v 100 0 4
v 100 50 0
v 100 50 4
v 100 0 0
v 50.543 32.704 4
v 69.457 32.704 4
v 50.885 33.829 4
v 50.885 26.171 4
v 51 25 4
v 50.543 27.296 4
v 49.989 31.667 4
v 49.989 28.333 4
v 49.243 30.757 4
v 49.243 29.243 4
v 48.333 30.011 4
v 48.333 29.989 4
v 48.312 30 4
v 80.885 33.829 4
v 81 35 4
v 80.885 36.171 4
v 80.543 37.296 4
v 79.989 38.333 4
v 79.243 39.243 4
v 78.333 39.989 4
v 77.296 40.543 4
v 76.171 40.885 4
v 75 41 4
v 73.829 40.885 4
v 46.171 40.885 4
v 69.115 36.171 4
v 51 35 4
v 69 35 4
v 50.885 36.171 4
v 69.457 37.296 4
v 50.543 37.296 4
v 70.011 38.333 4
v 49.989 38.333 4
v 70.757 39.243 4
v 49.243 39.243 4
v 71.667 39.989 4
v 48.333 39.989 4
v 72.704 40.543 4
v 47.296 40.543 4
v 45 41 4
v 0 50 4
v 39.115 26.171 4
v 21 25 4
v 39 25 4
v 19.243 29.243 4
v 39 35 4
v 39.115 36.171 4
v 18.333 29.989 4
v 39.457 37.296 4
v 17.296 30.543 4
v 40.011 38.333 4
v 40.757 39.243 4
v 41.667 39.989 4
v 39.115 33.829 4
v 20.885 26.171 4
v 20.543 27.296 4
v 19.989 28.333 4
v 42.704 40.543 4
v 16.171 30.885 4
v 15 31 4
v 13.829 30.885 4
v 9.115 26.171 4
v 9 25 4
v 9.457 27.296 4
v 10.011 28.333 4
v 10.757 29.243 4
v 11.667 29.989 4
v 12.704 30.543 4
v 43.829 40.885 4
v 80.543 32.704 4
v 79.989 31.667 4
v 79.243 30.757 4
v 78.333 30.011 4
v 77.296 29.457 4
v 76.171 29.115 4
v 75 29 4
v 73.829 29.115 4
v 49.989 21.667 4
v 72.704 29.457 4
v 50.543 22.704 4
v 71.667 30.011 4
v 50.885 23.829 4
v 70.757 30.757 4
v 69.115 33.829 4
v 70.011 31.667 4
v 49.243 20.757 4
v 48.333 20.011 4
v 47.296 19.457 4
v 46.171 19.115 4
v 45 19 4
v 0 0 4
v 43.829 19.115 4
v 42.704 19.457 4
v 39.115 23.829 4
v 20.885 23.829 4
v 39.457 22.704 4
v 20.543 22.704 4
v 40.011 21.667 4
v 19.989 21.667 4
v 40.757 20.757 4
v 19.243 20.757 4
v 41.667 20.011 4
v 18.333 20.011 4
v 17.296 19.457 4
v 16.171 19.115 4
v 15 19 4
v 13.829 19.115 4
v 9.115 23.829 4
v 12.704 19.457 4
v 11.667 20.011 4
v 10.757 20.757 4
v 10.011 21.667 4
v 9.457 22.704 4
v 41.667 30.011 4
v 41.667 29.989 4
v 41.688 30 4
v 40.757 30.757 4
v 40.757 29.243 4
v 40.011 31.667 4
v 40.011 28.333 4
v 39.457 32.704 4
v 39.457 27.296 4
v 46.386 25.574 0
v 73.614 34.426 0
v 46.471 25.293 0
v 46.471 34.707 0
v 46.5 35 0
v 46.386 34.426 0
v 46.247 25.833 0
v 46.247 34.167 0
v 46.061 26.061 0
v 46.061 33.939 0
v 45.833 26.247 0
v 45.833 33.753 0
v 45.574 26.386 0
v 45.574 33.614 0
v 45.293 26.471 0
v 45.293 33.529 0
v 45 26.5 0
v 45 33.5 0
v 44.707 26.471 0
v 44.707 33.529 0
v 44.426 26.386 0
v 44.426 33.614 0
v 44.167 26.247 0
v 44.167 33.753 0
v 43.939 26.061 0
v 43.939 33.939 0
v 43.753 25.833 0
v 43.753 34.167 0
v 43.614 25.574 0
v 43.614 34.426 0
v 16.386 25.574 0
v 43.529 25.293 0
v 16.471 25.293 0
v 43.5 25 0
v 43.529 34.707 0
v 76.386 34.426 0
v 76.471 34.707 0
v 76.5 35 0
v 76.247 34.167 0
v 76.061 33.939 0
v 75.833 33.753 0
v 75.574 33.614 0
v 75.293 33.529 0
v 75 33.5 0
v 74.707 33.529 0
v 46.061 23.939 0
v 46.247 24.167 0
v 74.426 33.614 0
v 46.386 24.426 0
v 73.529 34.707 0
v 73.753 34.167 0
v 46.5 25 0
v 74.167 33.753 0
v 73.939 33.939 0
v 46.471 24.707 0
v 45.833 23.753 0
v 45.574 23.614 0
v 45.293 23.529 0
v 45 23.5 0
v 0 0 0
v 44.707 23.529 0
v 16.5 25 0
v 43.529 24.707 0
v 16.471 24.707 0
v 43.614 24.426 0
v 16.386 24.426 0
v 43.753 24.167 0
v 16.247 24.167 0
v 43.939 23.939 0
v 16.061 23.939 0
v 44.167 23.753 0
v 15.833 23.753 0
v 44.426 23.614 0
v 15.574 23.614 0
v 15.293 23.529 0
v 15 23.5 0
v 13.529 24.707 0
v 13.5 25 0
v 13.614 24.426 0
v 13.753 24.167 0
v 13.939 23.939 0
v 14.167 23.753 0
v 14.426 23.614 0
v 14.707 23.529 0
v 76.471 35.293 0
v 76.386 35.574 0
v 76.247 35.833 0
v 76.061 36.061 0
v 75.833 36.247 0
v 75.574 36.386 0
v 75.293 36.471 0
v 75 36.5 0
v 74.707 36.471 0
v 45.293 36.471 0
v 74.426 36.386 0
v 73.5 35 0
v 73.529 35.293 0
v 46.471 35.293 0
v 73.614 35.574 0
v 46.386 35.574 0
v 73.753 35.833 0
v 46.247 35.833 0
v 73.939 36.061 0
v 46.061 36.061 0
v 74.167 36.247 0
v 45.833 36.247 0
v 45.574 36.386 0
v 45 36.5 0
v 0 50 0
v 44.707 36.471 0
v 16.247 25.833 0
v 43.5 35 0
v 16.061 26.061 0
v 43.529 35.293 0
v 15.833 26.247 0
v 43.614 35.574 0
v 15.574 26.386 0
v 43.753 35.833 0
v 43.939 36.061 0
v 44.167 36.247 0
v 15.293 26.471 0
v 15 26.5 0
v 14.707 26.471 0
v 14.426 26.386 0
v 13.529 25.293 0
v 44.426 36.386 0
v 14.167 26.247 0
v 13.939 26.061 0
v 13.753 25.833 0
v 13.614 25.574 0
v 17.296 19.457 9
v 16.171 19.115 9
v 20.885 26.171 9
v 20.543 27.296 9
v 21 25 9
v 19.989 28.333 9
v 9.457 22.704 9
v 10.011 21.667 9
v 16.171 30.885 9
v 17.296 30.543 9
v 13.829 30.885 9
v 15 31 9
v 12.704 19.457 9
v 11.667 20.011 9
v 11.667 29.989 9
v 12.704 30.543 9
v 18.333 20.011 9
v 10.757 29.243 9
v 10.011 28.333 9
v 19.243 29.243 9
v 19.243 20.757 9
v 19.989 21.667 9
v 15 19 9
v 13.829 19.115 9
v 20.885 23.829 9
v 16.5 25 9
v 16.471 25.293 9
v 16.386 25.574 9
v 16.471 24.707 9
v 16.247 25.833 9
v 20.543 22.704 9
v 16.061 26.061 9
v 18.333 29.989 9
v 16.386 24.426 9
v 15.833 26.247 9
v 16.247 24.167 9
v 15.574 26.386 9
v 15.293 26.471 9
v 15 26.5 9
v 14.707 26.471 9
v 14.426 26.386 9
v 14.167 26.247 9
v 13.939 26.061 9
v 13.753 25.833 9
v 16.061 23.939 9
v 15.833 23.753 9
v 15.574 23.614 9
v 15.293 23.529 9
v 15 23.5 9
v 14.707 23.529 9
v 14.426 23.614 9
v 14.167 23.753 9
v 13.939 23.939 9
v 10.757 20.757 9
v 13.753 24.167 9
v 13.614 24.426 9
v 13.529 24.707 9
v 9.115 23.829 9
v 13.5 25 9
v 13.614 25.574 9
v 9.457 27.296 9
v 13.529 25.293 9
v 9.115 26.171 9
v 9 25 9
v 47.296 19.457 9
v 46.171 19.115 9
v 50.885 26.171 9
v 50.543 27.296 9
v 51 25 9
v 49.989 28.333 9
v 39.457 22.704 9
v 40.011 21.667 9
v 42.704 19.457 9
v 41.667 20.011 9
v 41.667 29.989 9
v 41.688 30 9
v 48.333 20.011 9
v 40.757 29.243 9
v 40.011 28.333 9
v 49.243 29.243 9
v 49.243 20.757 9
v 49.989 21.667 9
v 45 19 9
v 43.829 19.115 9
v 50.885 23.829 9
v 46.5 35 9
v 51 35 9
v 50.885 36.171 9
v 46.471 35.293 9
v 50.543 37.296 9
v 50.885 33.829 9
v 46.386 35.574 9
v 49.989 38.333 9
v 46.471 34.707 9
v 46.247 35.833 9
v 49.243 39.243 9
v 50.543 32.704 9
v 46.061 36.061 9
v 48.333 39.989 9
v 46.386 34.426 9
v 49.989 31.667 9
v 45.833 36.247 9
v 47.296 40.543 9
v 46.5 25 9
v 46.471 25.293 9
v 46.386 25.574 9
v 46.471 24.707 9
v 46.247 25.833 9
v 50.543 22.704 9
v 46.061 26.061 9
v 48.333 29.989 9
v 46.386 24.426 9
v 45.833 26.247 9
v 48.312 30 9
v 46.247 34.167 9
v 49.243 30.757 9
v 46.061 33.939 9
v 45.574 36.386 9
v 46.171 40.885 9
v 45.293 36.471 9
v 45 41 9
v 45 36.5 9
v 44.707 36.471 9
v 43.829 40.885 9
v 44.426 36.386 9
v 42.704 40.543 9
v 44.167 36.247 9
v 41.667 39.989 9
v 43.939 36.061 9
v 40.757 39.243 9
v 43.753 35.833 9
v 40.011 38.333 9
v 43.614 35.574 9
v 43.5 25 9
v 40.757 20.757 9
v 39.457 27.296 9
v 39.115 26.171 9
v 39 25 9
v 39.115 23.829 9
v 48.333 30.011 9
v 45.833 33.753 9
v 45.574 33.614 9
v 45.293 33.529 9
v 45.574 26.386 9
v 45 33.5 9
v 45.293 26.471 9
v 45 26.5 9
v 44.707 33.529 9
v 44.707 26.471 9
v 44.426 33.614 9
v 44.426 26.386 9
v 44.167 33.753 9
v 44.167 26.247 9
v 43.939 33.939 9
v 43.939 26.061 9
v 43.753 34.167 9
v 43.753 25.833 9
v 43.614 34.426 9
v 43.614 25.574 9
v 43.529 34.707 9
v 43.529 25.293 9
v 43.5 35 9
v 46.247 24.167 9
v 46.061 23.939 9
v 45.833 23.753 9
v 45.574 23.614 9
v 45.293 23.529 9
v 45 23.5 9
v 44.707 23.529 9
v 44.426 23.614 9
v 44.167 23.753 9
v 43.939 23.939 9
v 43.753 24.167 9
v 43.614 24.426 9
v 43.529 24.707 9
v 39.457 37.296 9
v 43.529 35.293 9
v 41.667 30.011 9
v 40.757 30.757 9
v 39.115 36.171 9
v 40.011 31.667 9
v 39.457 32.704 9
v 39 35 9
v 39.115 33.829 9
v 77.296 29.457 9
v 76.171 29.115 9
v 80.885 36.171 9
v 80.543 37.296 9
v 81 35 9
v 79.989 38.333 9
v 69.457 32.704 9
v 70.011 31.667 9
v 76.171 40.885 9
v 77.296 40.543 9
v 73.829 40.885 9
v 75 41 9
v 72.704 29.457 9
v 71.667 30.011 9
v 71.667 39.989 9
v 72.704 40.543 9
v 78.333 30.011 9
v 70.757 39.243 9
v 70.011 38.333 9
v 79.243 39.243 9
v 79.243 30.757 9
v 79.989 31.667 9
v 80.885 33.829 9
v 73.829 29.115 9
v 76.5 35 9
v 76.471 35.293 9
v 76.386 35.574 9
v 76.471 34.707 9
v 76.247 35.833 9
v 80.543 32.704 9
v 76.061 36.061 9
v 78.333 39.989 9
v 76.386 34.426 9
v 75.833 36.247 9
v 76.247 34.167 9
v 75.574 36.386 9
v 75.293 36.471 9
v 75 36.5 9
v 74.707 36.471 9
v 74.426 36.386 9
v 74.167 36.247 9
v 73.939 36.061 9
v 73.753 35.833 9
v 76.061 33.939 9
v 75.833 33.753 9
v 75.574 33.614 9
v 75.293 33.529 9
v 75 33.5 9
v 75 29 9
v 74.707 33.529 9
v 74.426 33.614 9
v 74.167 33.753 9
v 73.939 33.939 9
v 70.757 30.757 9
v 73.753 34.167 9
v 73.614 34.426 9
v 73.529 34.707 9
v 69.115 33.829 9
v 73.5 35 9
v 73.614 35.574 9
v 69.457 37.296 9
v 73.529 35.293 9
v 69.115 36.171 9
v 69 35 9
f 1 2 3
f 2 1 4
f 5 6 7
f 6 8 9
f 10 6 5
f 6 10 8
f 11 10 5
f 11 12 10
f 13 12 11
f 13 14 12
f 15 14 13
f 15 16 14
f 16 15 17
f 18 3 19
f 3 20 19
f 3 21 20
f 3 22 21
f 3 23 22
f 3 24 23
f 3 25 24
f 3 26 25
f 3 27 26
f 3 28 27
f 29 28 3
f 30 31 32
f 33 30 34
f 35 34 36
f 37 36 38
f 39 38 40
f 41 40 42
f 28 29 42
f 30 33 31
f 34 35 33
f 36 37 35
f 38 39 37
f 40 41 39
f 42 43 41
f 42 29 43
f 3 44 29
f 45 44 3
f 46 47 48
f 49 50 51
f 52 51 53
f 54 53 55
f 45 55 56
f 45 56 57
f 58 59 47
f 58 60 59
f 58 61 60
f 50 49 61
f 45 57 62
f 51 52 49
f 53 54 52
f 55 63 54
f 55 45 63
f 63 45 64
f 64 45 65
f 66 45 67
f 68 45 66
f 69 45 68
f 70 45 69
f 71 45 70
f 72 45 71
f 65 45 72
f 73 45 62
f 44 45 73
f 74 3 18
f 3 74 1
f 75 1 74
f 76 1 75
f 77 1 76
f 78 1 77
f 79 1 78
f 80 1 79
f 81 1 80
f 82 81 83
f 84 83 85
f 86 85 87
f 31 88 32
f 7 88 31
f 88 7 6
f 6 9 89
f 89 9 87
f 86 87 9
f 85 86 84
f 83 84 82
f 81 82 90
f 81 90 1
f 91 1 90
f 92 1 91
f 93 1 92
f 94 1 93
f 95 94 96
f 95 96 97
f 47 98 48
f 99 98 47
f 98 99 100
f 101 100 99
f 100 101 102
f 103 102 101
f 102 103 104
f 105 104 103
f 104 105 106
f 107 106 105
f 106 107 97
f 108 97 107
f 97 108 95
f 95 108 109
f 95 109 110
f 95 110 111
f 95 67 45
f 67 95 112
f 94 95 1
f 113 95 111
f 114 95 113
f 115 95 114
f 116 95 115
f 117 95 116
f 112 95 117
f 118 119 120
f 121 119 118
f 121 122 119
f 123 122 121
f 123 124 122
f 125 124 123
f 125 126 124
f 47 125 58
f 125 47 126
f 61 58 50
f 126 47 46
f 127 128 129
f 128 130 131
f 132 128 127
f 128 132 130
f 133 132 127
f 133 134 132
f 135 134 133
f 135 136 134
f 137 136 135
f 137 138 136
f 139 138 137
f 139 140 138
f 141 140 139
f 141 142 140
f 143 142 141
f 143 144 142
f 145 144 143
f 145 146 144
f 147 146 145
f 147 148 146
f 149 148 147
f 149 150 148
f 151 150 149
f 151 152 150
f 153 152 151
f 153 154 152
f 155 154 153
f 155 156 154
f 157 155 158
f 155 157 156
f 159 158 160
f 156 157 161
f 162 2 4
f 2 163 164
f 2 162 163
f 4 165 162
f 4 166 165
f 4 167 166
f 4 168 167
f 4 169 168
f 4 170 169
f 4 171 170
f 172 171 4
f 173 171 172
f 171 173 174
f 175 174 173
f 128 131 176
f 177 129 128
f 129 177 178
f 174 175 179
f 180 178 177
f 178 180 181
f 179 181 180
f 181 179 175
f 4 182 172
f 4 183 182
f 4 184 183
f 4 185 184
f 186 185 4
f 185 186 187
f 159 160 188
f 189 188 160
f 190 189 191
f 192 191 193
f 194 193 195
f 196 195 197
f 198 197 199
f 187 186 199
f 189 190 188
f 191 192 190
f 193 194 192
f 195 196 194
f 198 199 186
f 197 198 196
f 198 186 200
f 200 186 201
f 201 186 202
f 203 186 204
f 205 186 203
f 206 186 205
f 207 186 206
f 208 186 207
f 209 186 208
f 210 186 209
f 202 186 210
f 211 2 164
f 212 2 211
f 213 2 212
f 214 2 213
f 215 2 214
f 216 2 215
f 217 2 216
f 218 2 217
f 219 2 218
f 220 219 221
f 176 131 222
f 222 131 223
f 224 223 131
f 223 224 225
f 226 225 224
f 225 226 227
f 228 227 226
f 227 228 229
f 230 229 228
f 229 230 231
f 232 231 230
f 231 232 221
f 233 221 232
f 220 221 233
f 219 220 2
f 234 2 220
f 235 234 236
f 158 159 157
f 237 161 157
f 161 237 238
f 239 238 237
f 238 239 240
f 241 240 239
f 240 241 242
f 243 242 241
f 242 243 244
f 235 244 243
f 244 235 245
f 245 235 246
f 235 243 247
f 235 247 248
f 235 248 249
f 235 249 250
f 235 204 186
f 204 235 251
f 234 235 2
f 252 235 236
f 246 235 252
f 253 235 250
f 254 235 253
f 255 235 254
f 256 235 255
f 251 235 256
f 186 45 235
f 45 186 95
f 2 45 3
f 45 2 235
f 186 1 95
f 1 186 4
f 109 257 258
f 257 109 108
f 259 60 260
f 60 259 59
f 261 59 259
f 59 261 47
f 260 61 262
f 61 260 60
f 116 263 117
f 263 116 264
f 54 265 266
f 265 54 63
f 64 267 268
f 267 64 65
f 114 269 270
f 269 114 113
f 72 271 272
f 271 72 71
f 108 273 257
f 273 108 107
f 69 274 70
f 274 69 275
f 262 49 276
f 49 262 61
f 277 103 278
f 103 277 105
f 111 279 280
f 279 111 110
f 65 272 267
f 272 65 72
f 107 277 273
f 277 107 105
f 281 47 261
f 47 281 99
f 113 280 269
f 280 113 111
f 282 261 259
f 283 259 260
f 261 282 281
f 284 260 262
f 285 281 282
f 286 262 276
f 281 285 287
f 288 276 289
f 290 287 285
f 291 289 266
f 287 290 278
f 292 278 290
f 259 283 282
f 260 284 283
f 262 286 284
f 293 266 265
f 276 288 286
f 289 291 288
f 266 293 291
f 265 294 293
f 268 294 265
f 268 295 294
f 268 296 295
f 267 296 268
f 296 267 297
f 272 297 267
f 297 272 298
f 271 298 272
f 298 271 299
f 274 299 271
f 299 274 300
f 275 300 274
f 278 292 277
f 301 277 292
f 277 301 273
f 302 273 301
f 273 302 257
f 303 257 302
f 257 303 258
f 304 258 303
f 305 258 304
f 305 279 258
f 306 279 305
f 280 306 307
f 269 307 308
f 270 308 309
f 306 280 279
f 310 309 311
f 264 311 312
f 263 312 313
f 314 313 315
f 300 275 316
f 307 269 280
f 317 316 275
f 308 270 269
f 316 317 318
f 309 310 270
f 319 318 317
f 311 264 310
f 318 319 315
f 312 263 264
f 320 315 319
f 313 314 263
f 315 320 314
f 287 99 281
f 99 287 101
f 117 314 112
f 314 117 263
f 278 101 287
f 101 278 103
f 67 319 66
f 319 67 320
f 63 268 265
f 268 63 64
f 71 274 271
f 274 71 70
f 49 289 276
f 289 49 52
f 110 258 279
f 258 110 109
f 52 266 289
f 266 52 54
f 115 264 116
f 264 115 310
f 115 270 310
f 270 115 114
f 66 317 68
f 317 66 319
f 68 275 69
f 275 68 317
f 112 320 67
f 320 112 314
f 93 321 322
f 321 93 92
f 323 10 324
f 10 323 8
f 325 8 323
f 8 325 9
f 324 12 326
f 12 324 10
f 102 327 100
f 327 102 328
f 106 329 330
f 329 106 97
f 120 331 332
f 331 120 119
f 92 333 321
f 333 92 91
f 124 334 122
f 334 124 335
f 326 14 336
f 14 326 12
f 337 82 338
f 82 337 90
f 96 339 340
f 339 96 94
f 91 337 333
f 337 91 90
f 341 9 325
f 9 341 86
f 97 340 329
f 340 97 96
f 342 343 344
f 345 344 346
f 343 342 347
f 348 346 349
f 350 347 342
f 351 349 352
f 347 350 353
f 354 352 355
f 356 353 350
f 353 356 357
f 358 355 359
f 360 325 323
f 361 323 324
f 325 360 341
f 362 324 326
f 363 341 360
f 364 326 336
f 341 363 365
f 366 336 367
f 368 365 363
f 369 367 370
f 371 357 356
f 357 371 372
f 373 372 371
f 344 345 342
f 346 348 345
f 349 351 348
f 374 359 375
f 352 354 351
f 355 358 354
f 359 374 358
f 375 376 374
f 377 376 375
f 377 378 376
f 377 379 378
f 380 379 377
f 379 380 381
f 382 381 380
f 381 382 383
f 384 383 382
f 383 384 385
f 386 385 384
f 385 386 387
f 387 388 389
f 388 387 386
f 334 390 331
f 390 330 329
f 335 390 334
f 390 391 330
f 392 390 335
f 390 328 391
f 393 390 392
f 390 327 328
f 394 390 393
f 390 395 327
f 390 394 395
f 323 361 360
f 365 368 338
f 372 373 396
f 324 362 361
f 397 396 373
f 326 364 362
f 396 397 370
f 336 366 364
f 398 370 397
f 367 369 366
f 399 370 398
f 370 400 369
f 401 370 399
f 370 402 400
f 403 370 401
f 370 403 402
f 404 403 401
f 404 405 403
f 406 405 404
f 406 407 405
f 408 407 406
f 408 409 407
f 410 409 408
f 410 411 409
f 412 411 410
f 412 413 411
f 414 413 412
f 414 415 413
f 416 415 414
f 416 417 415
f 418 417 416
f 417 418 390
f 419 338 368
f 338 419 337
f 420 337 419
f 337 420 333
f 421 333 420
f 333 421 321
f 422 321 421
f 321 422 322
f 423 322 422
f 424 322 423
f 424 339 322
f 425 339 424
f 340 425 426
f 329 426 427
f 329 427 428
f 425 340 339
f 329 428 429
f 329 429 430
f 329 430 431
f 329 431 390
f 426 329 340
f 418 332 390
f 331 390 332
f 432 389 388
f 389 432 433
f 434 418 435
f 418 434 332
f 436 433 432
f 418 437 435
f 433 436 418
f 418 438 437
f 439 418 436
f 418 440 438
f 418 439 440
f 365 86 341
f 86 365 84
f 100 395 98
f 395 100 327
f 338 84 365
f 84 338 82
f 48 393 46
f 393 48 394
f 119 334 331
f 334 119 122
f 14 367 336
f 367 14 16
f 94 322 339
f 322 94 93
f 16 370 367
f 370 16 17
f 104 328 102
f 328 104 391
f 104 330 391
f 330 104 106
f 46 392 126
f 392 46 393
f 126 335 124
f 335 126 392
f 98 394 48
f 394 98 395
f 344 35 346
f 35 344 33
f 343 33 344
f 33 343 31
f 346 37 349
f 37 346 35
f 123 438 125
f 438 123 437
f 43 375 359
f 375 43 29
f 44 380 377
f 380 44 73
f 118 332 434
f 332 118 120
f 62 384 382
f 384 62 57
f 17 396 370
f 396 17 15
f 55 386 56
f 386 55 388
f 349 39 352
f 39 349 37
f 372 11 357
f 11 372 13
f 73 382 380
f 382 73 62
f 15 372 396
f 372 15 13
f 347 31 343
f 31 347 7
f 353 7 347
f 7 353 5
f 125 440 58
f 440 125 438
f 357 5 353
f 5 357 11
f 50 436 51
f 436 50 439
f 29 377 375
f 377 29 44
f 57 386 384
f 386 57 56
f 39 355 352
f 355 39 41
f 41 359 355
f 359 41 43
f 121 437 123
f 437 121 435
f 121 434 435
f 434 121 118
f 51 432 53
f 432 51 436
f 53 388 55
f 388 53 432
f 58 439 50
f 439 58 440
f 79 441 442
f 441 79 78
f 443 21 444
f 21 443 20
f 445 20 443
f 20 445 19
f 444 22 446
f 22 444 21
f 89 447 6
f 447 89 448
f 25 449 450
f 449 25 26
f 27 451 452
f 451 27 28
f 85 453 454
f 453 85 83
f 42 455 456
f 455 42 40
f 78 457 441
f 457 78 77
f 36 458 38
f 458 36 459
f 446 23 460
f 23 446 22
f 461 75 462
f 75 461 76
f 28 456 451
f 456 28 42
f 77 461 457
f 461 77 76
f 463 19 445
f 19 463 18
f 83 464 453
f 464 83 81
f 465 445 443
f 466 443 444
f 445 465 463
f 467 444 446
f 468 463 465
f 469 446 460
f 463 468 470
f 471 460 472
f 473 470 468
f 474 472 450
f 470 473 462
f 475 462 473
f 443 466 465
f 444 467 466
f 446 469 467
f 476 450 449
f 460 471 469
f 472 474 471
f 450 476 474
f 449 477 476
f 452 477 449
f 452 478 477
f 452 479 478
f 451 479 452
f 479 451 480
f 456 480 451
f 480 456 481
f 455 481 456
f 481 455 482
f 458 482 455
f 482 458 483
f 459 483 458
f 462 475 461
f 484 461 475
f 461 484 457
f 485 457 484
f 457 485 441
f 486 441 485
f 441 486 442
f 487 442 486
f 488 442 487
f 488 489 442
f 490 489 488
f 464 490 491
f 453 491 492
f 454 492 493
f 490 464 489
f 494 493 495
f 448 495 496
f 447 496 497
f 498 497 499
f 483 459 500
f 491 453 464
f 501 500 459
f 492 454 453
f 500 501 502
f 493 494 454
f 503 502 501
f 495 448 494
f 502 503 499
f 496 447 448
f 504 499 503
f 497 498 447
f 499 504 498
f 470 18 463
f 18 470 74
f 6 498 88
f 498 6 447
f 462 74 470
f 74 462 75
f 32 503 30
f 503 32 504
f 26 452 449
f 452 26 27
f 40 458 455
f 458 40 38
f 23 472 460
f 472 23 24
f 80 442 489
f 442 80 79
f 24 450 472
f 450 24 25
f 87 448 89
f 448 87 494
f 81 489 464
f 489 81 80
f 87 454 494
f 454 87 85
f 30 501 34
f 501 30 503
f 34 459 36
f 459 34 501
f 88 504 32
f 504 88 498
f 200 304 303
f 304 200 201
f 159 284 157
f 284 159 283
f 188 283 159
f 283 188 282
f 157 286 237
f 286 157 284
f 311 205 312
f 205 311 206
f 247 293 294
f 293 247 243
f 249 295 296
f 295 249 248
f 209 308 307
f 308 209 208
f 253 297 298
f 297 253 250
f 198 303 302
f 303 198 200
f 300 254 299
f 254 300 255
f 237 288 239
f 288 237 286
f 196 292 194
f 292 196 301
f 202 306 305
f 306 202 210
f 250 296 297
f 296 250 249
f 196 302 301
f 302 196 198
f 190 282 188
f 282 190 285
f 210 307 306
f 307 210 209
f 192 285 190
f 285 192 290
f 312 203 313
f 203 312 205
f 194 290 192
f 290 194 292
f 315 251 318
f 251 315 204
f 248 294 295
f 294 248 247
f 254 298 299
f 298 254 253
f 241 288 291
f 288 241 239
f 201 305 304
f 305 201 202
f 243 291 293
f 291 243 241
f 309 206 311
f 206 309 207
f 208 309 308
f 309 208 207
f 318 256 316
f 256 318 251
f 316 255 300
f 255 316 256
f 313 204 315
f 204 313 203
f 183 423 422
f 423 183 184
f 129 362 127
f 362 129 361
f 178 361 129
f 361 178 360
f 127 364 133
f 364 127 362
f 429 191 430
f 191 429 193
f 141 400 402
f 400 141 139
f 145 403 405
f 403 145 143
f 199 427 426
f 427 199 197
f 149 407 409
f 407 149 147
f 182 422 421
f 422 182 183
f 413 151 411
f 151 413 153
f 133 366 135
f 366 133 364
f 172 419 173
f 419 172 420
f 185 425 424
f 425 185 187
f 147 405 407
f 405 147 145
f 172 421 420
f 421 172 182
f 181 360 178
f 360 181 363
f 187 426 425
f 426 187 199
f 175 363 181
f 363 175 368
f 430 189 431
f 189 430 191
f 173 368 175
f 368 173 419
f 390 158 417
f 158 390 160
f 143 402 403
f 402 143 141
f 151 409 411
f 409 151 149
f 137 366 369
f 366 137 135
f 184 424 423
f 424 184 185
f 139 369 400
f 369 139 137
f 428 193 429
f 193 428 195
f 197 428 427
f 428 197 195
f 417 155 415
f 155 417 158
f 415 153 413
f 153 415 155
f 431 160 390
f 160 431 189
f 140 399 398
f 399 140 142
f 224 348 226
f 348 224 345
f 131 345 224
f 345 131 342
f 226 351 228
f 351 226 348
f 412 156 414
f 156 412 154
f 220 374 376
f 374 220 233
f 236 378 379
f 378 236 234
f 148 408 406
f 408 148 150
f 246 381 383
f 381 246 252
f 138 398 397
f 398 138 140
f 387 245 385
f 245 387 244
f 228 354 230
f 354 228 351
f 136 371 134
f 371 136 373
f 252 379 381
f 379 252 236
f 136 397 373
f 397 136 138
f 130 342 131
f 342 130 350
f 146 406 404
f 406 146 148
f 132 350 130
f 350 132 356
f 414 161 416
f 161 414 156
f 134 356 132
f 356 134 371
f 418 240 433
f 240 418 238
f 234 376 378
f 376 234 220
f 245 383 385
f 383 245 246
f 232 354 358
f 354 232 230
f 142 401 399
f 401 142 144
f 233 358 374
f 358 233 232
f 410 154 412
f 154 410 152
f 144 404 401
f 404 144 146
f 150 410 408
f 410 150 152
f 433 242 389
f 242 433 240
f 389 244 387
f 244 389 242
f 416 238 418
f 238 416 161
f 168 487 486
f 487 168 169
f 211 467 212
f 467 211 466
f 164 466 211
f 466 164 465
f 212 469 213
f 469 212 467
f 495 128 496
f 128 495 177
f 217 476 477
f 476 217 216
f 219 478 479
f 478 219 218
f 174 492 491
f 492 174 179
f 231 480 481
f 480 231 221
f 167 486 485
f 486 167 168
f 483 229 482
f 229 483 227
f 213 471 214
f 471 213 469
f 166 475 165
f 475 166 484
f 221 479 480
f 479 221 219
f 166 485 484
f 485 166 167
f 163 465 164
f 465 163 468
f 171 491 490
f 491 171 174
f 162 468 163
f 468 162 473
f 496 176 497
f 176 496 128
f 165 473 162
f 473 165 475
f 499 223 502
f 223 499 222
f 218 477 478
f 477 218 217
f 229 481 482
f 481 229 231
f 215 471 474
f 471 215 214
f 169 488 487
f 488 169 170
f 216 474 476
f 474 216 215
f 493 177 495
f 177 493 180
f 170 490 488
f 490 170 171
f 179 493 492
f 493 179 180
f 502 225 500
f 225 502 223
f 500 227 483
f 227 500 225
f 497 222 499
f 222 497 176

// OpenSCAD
$fn = 32;

// ----------------------------------------------------------------------
// Boss field: plate with bosses at given coordinates
// ----------------------------------------------------------------------

// --- parameters (mm) ---
plate_l = 100;            // plate length, X
plate_w = 50;             // plate width, Y
plate_t = 4;              // plate thickness, Z
boss_d = 12;              // boss diameter
boss_h = 5;               // boss height above the plate
bore_d = 3;               // boss bore

total_h = plate_t + boss_h;  // overall height

difference() {
  union() {
    cube([plate_l, plate_w, plate_t]);
    translate([15, 25, plate_t]) cylinder(h = boss_h, d = boss_d);
    translate([45, 25, plate_t]) cylinder(h = boss_h, d = boss_d);
    translate([45, 35, plate_t]) cylinder(h = boss_h, d = boss_d);
    translate([75, 35, plate_t]) cylinder(h = boss_h, d = boss_d);
  }
  translate([15, 25, -1]) cylinder(h = total_h + 2, d = bore_d);
  translate([45, 25, -1]) cylinder(h = total_h + 2, d = bore_d);
  translate([45, 35, -1]) cylinder(h = total_h + 2, d = bore_d);
  translate([75, 35, -1]) cylinder(h = total_h + 2, d = bore_d);
}
